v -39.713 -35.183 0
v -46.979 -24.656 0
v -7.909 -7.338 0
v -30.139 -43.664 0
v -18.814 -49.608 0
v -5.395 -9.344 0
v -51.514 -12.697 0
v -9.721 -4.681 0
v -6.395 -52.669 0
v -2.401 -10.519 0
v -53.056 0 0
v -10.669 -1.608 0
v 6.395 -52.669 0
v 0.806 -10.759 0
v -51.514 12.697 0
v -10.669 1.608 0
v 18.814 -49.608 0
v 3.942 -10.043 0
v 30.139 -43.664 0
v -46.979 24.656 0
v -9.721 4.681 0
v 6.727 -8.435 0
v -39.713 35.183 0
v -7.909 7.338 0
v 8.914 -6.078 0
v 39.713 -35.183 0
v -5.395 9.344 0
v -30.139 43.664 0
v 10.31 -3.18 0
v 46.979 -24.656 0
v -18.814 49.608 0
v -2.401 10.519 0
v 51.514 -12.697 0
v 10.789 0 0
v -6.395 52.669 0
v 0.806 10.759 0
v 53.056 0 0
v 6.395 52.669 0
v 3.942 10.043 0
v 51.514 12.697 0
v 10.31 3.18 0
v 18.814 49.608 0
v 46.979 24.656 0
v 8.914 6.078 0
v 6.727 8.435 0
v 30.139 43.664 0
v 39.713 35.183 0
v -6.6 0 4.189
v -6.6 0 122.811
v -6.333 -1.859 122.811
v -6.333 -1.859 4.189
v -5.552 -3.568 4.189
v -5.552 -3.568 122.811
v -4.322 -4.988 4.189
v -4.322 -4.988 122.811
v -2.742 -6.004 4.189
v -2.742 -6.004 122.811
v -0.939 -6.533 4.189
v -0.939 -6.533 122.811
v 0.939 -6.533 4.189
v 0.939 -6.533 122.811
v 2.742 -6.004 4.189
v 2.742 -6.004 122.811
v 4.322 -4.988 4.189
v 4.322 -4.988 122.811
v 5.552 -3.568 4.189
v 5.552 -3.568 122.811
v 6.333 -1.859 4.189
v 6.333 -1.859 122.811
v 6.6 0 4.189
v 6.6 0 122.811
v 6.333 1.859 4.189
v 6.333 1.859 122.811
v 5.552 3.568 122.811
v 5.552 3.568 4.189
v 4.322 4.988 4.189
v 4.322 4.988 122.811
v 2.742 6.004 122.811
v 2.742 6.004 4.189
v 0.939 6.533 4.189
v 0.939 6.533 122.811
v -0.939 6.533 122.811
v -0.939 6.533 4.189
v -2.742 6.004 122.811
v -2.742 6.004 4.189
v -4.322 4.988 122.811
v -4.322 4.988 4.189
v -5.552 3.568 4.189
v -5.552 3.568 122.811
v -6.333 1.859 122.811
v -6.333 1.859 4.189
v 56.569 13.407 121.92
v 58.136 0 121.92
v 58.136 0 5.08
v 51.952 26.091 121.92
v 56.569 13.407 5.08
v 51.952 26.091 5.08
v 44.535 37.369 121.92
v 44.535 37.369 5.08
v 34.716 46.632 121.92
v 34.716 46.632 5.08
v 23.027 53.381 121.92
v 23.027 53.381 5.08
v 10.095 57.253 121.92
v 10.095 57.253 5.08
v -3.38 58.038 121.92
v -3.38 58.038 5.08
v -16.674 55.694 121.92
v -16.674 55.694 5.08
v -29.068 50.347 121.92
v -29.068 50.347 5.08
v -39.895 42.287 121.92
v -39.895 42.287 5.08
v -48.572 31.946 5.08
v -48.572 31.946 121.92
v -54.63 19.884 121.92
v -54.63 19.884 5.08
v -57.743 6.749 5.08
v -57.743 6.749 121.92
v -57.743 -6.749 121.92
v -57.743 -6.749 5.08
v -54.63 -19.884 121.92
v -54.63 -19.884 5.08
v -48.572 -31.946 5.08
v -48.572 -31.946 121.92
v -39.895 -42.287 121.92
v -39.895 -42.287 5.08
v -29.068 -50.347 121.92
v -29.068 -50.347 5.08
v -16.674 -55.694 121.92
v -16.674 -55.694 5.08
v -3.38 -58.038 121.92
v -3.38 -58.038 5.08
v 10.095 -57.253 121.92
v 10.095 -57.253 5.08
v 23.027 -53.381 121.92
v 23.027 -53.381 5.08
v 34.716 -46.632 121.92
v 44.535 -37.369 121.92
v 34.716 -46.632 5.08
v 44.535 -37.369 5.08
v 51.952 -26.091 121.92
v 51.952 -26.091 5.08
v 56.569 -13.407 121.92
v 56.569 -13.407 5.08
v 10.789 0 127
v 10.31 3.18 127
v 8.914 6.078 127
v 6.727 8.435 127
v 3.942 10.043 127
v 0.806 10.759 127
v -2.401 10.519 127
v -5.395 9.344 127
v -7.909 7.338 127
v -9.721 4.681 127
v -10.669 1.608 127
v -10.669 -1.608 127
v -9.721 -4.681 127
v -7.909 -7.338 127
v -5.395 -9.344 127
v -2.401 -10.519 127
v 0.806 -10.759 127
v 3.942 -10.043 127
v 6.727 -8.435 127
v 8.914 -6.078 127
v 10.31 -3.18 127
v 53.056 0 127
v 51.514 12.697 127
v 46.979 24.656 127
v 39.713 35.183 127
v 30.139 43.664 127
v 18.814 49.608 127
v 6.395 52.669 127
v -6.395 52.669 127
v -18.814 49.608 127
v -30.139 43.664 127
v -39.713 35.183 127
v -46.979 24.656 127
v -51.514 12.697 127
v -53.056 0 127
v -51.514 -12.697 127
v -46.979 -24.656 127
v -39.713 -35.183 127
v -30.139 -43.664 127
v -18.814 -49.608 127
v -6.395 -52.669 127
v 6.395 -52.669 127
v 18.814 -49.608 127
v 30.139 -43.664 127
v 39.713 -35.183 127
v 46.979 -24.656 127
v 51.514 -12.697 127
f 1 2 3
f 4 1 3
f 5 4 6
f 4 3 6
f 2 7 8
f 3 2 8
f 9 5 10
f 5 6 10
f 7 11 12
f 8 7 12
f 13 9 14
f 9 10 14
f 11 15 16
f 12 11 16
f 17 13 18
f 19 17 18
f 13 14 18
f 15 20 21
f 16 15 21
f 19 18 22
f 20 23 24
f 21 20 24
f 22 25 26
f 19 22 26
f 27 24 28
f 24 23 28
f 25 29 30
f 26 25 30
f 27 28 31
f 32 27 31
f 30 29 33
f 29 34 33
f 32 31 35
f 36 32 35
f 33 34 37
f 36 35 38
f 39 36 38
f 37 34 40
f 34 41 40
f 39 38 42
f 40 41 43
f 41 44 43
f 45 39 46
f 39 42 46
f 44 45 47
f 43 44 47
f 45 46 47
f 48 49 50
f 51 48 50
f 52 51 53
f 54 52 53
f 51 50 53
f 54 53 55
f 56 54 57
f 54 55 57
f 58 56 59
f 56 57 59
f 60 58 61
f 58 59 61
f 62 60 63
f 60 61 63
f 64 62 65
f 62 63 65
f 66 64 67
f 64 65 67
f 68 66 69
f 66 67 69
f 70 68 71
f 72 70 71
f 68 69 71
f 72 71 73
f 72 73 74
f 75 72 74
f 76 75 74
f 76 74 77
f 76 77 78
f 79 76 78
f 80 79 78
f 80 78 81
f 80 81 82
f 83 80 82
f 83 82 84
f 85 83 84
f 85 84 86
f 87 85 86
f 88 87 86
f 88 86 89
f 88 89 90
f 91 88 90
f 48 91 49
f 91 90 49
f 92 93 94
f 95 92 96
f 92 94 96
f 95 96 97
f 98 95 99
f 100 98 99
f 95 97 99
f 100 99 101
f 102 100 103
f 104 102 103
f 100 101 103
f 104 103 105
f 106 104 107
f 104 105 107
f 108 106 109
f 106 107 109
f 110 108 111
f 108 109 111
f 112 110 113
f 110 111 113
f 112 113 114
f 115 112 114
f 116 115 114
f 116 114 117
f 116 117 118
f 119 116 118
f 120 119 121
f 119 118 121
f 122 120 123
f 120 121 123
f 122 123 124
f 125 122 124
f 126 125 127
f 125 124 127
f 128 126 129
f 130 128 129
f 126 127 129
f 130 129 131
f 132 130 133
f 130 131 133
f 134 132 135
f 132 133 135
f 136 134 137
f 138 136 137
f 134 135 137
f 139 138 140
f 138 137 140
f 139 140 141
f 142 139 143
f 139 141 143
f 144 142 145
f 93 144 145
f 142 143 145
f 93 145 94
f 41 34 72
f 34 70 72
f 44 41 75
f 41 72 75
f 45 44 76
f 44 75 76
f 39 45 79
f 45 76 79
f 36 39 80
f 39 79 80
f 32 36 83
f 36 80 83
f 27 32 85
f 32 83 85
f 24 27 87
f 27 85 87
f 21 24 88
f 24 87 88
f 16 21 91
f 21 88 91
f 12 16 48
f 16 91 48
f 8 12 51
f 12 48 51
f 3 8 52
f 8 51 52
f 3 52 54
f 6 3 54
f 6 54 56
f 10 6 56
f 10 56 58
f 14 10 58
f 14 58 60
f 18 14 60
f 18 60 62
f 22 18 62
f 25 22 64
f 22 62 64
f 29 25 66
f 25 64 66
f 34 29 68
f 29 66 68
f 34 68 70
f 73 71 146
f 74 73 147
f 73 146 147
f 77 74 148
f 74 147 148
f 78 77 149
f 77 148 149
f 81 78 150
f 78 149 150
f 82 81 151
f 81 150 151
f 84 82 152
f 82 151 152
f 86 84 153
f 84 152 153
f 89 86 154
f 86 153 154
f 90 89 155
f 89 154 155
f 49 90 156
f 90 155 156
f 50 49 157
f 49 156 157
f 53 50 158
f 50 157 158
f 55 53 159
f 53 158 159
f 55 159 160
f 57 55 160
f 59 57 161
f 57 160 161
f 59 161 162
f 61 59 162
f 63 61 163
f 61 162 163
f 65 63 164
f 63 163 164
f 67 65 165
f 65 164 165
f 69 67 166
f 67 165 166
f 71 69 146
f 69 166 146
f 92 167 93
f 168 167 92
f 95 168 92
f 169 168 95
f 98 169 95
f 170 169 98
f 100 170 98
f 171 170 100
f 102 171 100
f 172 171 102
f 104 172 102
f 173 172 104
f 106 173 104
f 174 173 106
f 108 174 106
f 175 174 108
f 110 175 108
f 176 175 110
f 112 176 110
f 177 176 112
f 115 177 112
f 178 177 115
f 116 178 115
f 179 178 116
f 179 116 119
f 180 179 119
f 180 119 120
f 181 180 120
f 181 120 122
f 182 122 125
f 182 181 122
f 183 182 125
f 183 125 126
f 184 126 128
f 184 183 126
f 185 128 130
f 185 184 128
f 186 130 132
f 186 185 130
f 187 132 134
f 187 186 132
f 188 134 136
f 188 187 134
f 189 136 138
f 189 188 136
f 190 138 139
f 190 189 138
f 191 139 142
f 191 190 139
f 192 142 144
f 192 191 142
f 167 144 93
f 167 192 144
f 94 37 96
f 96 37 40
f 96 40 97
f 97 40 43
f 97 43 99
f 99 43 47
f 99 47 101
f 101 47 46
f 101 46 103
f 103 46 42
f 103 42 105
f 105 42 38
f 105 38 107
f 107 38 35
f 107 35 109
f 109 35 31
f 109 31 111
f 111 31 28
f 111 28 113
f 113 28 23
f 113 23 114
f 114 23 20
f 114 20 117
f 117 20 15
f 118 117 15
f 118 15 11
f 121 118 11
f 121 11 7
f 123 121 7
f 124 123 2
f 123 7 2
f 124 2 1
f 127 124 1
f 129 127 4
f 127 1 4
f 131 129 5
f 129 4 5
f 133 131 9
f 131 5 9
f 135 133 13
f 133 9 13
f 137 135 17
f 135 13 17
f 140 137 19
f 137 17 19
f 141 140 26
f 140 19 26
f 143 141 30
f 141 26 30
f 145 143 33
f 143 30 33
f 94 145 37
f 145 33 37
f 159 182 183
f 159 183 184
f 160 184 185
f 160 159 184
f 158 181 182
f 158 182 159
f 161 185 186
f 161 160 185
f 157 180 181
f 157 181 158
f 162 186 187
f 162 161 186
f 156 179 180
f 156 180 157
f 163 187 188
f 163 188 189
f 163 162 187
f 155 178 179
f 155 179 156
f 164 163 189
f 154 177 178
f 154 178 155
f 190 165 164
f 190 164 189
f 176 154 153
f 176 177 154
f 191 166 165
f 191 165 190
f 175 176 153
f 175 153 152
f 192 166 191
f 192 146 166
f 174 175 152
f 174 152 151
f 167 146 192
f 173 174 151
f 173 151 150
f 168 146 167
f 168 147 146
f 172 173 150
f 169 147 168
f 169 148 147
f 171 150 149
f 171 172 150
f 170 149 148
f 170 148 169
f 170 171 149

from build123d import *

# Parameters (mm, degrees)
F0_R     = 58.136041623
F0_R_2   = 5.7090569563
F1_DEPTH = 127
F2_SIZE  = 5.08
F3_SIZE  = 5.08
F4_D     = 13.2


with BuildPart() as f1:
    # F0 (on Top) → F1 (new body)
    with BuildSketch(Plane.XY):
        Circle(F0_R)
        Circle(F0_R_2, mode=Mode.SUBTRACT)
    extrude(amount=F1_DEPTH)

    # F2
    f2_edges = [f1.edges().sort_by_distance(p)[0] for p in [
        (-58.136042, 0, 127),
        (-5.709057, 0, 127),
    ]]
    chamfer(f2_edges, length=F2_SIZE)

    # F3
    f3_edges = [f1.edges().sort_by_distance(p)[0] for p in [
        (-58.136042, 0, 0),
        (-5.709057, 0, 0),
    ]]
    chamfer(f3_edges, length=F3_SIZE)

    # F4 (through all)
    with Locations(Plane(origin=(0, 0, 0), x_dir=(1, 0, 0), z_dir=(0, 0, -1))):
        with Locations((0, 0)):
            Hole(F4_D / 2)


solid = f1.part
